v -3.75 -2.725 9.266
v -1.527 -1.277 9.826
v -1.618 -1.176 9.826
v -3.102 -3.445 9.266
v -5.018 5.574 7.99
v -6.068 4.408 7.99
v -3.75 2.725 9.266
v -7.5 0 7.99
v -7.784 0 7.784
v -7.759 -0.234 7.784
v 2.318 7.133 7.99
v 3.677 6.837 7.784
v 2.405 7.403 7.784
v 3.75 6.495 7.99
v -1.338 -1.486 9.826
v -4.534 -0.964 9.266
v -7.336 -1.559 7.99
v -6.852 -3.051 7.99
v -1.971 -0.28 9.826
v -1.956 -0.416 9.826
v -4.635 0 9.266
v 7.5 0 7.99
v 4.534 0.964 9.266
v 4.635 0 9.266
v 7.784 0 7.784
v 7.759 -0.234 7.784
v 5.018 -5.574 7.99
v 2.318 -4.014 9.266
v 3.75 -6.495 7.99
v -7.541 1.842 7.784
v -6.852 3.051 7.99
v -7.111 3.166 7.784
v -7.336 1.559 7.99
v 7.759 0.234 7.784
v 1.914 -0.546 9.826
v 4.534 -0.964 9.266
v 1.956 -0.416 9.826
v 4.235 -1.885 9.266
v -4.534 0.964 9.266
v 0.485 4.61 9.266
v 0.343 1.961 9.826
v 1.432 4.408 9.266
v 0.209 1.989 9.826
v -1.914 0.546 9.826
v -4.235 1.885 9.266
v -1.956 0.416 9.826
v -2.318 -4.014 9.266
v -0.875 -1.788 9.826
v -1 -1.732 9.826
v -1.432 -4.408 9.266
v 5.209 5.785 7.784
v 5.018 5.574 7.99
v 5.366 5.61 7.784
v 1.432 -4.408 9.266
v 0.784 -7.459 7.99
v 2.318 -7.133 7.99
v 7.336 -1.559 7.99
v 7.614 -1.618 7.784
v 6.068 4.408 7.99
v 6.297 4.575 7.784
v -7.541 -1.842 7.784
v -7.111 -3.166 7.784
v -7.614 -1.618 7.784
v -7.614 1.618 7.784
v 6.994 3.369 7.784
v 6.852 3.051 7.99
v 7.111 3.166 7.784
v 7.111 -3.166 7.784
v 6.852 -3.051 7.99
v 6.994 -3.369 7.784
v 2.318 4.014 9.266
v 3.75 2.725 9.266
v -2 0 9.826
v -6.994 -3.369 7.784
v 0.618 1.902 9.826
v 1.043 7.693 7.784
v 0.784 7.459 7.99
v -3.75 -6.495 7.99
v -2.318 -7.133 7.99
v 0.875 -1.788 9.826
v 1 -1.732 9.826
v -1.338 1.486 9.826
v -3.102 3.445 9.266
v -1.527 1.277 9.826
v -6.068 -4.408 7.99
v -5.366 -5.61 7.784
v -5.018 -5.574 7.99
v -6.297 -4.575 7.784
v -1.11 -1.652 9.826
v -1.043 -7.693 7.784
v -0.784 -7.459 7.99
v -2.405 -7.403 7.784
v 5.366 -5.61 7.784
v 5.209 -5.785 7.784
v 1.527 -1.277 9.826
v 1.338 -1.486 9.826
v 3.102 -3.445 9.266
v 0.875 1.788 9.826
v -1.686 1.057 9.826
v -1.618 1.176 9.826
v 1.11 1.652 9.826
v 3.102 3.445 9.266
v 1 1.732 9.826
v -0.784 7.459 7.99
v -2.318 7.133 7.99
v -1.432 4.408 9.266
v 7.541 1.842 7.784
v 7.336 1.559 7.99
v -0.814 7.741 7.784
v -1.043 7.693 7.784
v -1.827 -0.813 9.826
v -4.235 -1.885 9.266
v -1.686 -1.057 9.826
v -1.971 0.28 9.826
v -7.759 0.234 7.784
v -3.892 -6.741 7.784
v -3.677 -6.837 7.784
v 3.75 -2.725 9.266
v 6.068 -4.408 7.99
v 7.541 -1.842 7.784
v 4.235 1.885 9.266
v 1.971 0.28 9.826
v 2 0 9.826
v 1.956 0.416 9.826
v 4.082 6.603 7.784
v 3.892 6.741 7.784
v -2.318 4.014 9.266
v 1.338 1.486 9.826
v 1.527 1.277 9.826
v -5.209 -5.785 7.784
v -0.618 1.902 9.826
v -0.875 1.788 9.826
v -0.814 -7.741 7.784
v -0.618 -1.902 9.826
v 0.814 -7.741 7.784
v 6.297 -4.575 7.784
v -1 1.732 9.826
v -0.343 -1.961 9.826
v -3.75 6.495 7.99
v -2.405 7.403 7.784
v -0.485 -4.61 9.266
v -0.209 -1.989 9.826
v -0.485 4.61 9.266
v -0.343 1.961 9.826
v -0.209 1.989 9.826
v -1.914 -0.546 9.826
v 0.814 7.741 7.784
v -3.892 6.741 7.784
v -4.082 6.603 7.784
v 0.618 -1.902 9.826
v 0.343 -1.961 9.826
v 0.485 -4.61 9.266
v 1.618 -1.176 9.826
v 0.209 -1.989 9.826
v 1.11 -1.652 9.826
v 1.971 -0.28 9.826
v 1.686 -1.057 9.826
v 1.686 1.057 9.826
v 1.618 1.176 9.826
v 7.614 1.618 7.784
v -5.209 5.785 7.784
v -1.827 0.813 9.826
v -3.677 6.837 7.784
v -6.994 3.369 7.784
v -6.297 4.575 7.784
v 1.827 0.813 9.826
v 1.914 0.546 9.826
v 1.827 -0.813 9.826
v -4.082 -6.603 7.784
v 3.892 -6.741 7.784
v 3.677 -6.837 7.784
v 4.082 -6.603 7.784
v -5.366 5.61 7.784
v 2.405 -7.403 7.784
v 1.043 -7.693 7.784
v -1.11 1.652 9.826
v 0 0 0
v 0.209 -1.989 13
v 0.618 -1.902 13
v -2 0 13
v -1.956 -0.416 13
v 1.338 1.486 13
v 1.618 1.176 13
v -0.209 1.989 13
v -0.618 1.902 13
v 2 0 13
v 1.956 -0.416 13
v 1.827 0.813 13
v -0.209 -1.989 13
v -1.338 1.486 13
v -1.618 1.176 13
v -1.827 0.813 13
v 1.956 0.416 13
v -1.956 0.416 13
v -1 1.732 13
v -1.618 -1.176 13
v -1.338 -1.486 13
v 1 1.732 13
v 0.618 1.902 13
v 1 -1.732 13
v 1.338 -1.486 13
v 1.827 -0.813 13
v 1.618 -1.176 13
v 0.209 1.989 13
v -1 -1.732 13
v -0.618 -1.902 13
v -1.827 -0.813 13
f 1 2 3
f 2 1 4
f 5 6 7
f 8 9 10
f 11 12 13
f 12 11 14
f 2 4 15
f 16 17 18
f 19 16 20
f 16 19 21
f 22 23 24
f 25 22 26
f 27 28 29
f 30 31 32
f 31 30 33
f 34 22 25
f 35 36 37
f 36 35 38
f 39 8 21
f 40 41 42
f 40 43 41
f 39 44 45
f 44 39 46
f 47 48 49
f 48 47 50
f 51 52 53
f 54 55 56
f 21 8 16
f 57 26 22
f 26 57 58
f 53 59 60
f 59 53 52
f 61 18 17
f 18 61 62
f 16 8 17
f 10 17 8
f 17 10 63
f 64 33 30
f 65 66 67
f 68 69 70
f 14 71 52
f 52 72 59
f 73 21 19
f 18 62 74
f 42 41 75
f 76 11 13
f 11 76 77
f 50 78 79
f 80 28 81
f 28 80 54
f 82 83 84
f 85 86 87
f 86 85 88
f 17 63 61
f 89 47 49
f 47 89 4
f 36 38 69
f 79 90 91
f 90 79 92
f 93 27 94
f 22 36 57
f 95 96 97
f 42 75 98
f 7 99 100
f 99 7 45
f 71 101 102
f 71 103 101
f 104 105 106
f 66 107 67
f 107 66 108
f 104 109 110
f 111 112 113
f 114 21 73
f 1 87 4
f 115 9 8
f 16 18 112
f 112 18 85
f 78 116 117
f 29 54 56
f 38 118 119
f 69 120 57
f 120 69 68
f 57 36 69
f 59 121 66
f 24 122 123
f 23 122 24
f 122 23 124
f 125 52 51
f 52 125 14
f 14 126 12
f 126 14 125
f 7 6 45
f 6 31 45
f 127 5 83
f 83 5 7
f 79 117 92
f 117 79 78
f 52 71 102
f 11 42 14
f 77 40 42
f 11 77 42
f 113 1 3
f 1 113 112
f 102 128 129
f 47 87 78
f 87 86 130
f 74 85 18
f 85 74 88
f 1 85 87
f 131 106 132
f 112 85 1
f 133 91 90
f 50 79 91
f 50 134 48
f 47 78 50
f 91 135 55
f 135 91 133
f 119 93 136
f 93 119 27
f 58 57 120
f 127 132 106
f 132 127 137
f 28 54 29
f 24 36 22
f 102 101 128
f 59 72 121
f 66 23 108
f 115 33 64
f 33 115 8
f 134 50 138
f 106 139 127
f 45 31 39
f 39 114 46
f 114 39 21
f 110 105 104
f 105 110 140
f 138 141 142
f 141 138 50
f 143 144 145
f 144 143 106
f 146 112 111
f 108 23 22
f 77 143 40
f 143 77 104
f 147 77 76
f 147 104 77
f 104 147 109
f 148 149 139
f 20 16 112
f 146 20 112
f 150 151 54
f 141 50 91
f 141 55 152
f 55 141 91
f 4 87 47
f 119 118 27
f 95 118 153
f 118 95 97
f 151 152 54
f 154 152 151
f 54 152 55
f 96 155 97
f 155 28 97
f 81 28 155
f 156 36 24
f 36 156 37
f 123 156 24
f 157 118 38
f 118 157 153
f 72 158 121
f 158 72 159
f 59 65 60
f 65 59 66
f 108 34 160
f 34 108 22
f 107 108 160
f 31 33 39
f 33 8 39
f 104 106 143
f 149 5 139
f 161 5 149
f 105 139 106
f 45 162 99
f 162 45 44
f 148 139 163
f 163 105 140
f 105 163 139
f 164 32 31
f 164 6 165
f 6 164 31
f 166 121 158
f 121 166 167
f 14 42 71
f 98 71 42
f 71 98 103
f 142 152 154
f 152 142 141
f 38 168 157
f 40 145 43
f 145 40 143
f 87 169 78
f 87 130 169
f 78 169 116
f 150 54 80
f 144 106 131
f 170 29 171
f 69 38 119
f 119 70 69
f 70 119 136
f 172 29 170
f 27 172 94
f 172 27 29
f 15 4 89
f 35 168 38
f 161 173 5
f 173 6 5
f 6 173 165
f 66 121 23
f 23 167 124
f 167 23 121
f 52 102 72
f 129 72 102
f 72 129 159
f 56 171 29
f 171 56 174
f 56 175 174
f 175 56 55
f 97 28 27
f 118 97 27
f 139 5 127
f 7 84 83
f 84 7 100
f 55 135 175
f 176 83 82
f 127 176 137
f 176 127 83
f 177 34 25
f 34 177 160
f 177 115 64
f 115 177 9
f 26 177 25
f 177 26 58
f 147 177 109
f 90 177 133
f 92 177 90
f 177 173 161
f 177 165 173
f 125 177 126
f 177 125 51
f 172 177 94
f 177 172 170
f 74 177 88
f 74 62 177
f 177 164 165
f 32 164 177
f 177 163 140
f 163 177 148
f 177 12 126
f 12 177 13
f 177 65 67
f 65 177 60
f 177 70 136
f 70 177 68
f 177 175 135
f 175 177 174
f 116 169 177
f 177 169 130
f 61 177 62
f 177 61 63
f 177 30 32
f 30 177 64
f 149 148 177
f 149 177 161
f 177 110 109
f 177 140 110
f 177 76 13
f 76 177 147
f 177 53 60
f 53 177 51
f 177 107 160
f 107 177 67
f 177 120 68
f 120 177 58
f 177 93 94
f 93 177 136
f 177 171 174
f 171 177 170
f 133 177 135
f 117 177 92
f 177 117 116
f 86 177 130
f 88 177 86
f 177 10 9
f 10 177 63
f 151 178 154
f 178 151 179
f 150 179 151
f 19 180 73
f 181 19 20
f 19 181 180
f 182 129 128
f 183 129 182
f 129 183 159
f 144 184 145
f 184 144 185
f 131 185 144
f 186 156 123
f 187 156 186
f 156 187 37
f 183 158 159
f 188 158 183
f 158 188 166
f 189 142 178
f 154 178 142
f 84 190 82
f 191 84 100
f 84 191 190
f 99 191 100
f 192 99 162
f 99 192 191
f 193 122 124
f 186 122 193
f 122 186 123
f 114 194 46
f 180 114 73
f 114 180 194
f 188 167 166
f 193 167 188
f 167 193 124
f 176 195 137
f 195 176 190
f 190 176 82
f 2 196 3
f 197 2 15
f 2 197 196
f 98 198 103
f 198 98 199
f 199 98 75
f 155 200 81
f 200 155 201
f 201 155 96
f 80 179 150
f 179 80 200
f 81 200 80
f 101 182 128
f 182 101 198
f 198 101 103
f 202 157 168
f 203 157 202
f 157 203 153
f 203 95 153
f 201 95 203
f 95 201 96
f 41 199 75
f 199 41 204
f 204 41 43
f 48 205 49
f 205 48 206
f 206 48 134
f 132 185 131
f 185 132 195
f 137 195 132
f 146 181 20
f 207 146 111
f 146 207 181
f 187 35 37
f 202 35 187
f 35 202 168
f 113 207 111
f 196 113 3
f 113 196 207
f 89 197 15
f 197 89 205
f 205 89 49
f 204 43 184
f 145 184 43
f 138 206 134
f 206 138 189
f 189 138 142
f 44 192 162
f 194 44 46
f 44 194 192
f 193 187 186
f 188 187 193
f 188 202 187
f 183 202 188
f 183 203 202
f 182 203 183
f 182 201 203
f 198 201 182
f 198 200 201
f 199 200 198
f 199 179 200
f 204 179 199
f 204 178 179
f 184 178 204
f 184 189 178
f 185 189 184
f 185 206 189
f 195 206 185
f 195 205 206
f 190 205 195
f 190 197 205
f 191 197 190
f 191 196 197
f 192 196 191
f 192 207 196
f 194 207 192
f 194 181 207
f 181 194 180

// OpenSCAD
//3D Shapes- Design Time: Top

$fn = 30;

intersection() {
    translate([0, 0, -5]) sphere(15);
    cylinder(h=10, r1=0, r2=10);
}
translate([0, 0, 8]) cylinder(h=5, r1=2, r2=2);
